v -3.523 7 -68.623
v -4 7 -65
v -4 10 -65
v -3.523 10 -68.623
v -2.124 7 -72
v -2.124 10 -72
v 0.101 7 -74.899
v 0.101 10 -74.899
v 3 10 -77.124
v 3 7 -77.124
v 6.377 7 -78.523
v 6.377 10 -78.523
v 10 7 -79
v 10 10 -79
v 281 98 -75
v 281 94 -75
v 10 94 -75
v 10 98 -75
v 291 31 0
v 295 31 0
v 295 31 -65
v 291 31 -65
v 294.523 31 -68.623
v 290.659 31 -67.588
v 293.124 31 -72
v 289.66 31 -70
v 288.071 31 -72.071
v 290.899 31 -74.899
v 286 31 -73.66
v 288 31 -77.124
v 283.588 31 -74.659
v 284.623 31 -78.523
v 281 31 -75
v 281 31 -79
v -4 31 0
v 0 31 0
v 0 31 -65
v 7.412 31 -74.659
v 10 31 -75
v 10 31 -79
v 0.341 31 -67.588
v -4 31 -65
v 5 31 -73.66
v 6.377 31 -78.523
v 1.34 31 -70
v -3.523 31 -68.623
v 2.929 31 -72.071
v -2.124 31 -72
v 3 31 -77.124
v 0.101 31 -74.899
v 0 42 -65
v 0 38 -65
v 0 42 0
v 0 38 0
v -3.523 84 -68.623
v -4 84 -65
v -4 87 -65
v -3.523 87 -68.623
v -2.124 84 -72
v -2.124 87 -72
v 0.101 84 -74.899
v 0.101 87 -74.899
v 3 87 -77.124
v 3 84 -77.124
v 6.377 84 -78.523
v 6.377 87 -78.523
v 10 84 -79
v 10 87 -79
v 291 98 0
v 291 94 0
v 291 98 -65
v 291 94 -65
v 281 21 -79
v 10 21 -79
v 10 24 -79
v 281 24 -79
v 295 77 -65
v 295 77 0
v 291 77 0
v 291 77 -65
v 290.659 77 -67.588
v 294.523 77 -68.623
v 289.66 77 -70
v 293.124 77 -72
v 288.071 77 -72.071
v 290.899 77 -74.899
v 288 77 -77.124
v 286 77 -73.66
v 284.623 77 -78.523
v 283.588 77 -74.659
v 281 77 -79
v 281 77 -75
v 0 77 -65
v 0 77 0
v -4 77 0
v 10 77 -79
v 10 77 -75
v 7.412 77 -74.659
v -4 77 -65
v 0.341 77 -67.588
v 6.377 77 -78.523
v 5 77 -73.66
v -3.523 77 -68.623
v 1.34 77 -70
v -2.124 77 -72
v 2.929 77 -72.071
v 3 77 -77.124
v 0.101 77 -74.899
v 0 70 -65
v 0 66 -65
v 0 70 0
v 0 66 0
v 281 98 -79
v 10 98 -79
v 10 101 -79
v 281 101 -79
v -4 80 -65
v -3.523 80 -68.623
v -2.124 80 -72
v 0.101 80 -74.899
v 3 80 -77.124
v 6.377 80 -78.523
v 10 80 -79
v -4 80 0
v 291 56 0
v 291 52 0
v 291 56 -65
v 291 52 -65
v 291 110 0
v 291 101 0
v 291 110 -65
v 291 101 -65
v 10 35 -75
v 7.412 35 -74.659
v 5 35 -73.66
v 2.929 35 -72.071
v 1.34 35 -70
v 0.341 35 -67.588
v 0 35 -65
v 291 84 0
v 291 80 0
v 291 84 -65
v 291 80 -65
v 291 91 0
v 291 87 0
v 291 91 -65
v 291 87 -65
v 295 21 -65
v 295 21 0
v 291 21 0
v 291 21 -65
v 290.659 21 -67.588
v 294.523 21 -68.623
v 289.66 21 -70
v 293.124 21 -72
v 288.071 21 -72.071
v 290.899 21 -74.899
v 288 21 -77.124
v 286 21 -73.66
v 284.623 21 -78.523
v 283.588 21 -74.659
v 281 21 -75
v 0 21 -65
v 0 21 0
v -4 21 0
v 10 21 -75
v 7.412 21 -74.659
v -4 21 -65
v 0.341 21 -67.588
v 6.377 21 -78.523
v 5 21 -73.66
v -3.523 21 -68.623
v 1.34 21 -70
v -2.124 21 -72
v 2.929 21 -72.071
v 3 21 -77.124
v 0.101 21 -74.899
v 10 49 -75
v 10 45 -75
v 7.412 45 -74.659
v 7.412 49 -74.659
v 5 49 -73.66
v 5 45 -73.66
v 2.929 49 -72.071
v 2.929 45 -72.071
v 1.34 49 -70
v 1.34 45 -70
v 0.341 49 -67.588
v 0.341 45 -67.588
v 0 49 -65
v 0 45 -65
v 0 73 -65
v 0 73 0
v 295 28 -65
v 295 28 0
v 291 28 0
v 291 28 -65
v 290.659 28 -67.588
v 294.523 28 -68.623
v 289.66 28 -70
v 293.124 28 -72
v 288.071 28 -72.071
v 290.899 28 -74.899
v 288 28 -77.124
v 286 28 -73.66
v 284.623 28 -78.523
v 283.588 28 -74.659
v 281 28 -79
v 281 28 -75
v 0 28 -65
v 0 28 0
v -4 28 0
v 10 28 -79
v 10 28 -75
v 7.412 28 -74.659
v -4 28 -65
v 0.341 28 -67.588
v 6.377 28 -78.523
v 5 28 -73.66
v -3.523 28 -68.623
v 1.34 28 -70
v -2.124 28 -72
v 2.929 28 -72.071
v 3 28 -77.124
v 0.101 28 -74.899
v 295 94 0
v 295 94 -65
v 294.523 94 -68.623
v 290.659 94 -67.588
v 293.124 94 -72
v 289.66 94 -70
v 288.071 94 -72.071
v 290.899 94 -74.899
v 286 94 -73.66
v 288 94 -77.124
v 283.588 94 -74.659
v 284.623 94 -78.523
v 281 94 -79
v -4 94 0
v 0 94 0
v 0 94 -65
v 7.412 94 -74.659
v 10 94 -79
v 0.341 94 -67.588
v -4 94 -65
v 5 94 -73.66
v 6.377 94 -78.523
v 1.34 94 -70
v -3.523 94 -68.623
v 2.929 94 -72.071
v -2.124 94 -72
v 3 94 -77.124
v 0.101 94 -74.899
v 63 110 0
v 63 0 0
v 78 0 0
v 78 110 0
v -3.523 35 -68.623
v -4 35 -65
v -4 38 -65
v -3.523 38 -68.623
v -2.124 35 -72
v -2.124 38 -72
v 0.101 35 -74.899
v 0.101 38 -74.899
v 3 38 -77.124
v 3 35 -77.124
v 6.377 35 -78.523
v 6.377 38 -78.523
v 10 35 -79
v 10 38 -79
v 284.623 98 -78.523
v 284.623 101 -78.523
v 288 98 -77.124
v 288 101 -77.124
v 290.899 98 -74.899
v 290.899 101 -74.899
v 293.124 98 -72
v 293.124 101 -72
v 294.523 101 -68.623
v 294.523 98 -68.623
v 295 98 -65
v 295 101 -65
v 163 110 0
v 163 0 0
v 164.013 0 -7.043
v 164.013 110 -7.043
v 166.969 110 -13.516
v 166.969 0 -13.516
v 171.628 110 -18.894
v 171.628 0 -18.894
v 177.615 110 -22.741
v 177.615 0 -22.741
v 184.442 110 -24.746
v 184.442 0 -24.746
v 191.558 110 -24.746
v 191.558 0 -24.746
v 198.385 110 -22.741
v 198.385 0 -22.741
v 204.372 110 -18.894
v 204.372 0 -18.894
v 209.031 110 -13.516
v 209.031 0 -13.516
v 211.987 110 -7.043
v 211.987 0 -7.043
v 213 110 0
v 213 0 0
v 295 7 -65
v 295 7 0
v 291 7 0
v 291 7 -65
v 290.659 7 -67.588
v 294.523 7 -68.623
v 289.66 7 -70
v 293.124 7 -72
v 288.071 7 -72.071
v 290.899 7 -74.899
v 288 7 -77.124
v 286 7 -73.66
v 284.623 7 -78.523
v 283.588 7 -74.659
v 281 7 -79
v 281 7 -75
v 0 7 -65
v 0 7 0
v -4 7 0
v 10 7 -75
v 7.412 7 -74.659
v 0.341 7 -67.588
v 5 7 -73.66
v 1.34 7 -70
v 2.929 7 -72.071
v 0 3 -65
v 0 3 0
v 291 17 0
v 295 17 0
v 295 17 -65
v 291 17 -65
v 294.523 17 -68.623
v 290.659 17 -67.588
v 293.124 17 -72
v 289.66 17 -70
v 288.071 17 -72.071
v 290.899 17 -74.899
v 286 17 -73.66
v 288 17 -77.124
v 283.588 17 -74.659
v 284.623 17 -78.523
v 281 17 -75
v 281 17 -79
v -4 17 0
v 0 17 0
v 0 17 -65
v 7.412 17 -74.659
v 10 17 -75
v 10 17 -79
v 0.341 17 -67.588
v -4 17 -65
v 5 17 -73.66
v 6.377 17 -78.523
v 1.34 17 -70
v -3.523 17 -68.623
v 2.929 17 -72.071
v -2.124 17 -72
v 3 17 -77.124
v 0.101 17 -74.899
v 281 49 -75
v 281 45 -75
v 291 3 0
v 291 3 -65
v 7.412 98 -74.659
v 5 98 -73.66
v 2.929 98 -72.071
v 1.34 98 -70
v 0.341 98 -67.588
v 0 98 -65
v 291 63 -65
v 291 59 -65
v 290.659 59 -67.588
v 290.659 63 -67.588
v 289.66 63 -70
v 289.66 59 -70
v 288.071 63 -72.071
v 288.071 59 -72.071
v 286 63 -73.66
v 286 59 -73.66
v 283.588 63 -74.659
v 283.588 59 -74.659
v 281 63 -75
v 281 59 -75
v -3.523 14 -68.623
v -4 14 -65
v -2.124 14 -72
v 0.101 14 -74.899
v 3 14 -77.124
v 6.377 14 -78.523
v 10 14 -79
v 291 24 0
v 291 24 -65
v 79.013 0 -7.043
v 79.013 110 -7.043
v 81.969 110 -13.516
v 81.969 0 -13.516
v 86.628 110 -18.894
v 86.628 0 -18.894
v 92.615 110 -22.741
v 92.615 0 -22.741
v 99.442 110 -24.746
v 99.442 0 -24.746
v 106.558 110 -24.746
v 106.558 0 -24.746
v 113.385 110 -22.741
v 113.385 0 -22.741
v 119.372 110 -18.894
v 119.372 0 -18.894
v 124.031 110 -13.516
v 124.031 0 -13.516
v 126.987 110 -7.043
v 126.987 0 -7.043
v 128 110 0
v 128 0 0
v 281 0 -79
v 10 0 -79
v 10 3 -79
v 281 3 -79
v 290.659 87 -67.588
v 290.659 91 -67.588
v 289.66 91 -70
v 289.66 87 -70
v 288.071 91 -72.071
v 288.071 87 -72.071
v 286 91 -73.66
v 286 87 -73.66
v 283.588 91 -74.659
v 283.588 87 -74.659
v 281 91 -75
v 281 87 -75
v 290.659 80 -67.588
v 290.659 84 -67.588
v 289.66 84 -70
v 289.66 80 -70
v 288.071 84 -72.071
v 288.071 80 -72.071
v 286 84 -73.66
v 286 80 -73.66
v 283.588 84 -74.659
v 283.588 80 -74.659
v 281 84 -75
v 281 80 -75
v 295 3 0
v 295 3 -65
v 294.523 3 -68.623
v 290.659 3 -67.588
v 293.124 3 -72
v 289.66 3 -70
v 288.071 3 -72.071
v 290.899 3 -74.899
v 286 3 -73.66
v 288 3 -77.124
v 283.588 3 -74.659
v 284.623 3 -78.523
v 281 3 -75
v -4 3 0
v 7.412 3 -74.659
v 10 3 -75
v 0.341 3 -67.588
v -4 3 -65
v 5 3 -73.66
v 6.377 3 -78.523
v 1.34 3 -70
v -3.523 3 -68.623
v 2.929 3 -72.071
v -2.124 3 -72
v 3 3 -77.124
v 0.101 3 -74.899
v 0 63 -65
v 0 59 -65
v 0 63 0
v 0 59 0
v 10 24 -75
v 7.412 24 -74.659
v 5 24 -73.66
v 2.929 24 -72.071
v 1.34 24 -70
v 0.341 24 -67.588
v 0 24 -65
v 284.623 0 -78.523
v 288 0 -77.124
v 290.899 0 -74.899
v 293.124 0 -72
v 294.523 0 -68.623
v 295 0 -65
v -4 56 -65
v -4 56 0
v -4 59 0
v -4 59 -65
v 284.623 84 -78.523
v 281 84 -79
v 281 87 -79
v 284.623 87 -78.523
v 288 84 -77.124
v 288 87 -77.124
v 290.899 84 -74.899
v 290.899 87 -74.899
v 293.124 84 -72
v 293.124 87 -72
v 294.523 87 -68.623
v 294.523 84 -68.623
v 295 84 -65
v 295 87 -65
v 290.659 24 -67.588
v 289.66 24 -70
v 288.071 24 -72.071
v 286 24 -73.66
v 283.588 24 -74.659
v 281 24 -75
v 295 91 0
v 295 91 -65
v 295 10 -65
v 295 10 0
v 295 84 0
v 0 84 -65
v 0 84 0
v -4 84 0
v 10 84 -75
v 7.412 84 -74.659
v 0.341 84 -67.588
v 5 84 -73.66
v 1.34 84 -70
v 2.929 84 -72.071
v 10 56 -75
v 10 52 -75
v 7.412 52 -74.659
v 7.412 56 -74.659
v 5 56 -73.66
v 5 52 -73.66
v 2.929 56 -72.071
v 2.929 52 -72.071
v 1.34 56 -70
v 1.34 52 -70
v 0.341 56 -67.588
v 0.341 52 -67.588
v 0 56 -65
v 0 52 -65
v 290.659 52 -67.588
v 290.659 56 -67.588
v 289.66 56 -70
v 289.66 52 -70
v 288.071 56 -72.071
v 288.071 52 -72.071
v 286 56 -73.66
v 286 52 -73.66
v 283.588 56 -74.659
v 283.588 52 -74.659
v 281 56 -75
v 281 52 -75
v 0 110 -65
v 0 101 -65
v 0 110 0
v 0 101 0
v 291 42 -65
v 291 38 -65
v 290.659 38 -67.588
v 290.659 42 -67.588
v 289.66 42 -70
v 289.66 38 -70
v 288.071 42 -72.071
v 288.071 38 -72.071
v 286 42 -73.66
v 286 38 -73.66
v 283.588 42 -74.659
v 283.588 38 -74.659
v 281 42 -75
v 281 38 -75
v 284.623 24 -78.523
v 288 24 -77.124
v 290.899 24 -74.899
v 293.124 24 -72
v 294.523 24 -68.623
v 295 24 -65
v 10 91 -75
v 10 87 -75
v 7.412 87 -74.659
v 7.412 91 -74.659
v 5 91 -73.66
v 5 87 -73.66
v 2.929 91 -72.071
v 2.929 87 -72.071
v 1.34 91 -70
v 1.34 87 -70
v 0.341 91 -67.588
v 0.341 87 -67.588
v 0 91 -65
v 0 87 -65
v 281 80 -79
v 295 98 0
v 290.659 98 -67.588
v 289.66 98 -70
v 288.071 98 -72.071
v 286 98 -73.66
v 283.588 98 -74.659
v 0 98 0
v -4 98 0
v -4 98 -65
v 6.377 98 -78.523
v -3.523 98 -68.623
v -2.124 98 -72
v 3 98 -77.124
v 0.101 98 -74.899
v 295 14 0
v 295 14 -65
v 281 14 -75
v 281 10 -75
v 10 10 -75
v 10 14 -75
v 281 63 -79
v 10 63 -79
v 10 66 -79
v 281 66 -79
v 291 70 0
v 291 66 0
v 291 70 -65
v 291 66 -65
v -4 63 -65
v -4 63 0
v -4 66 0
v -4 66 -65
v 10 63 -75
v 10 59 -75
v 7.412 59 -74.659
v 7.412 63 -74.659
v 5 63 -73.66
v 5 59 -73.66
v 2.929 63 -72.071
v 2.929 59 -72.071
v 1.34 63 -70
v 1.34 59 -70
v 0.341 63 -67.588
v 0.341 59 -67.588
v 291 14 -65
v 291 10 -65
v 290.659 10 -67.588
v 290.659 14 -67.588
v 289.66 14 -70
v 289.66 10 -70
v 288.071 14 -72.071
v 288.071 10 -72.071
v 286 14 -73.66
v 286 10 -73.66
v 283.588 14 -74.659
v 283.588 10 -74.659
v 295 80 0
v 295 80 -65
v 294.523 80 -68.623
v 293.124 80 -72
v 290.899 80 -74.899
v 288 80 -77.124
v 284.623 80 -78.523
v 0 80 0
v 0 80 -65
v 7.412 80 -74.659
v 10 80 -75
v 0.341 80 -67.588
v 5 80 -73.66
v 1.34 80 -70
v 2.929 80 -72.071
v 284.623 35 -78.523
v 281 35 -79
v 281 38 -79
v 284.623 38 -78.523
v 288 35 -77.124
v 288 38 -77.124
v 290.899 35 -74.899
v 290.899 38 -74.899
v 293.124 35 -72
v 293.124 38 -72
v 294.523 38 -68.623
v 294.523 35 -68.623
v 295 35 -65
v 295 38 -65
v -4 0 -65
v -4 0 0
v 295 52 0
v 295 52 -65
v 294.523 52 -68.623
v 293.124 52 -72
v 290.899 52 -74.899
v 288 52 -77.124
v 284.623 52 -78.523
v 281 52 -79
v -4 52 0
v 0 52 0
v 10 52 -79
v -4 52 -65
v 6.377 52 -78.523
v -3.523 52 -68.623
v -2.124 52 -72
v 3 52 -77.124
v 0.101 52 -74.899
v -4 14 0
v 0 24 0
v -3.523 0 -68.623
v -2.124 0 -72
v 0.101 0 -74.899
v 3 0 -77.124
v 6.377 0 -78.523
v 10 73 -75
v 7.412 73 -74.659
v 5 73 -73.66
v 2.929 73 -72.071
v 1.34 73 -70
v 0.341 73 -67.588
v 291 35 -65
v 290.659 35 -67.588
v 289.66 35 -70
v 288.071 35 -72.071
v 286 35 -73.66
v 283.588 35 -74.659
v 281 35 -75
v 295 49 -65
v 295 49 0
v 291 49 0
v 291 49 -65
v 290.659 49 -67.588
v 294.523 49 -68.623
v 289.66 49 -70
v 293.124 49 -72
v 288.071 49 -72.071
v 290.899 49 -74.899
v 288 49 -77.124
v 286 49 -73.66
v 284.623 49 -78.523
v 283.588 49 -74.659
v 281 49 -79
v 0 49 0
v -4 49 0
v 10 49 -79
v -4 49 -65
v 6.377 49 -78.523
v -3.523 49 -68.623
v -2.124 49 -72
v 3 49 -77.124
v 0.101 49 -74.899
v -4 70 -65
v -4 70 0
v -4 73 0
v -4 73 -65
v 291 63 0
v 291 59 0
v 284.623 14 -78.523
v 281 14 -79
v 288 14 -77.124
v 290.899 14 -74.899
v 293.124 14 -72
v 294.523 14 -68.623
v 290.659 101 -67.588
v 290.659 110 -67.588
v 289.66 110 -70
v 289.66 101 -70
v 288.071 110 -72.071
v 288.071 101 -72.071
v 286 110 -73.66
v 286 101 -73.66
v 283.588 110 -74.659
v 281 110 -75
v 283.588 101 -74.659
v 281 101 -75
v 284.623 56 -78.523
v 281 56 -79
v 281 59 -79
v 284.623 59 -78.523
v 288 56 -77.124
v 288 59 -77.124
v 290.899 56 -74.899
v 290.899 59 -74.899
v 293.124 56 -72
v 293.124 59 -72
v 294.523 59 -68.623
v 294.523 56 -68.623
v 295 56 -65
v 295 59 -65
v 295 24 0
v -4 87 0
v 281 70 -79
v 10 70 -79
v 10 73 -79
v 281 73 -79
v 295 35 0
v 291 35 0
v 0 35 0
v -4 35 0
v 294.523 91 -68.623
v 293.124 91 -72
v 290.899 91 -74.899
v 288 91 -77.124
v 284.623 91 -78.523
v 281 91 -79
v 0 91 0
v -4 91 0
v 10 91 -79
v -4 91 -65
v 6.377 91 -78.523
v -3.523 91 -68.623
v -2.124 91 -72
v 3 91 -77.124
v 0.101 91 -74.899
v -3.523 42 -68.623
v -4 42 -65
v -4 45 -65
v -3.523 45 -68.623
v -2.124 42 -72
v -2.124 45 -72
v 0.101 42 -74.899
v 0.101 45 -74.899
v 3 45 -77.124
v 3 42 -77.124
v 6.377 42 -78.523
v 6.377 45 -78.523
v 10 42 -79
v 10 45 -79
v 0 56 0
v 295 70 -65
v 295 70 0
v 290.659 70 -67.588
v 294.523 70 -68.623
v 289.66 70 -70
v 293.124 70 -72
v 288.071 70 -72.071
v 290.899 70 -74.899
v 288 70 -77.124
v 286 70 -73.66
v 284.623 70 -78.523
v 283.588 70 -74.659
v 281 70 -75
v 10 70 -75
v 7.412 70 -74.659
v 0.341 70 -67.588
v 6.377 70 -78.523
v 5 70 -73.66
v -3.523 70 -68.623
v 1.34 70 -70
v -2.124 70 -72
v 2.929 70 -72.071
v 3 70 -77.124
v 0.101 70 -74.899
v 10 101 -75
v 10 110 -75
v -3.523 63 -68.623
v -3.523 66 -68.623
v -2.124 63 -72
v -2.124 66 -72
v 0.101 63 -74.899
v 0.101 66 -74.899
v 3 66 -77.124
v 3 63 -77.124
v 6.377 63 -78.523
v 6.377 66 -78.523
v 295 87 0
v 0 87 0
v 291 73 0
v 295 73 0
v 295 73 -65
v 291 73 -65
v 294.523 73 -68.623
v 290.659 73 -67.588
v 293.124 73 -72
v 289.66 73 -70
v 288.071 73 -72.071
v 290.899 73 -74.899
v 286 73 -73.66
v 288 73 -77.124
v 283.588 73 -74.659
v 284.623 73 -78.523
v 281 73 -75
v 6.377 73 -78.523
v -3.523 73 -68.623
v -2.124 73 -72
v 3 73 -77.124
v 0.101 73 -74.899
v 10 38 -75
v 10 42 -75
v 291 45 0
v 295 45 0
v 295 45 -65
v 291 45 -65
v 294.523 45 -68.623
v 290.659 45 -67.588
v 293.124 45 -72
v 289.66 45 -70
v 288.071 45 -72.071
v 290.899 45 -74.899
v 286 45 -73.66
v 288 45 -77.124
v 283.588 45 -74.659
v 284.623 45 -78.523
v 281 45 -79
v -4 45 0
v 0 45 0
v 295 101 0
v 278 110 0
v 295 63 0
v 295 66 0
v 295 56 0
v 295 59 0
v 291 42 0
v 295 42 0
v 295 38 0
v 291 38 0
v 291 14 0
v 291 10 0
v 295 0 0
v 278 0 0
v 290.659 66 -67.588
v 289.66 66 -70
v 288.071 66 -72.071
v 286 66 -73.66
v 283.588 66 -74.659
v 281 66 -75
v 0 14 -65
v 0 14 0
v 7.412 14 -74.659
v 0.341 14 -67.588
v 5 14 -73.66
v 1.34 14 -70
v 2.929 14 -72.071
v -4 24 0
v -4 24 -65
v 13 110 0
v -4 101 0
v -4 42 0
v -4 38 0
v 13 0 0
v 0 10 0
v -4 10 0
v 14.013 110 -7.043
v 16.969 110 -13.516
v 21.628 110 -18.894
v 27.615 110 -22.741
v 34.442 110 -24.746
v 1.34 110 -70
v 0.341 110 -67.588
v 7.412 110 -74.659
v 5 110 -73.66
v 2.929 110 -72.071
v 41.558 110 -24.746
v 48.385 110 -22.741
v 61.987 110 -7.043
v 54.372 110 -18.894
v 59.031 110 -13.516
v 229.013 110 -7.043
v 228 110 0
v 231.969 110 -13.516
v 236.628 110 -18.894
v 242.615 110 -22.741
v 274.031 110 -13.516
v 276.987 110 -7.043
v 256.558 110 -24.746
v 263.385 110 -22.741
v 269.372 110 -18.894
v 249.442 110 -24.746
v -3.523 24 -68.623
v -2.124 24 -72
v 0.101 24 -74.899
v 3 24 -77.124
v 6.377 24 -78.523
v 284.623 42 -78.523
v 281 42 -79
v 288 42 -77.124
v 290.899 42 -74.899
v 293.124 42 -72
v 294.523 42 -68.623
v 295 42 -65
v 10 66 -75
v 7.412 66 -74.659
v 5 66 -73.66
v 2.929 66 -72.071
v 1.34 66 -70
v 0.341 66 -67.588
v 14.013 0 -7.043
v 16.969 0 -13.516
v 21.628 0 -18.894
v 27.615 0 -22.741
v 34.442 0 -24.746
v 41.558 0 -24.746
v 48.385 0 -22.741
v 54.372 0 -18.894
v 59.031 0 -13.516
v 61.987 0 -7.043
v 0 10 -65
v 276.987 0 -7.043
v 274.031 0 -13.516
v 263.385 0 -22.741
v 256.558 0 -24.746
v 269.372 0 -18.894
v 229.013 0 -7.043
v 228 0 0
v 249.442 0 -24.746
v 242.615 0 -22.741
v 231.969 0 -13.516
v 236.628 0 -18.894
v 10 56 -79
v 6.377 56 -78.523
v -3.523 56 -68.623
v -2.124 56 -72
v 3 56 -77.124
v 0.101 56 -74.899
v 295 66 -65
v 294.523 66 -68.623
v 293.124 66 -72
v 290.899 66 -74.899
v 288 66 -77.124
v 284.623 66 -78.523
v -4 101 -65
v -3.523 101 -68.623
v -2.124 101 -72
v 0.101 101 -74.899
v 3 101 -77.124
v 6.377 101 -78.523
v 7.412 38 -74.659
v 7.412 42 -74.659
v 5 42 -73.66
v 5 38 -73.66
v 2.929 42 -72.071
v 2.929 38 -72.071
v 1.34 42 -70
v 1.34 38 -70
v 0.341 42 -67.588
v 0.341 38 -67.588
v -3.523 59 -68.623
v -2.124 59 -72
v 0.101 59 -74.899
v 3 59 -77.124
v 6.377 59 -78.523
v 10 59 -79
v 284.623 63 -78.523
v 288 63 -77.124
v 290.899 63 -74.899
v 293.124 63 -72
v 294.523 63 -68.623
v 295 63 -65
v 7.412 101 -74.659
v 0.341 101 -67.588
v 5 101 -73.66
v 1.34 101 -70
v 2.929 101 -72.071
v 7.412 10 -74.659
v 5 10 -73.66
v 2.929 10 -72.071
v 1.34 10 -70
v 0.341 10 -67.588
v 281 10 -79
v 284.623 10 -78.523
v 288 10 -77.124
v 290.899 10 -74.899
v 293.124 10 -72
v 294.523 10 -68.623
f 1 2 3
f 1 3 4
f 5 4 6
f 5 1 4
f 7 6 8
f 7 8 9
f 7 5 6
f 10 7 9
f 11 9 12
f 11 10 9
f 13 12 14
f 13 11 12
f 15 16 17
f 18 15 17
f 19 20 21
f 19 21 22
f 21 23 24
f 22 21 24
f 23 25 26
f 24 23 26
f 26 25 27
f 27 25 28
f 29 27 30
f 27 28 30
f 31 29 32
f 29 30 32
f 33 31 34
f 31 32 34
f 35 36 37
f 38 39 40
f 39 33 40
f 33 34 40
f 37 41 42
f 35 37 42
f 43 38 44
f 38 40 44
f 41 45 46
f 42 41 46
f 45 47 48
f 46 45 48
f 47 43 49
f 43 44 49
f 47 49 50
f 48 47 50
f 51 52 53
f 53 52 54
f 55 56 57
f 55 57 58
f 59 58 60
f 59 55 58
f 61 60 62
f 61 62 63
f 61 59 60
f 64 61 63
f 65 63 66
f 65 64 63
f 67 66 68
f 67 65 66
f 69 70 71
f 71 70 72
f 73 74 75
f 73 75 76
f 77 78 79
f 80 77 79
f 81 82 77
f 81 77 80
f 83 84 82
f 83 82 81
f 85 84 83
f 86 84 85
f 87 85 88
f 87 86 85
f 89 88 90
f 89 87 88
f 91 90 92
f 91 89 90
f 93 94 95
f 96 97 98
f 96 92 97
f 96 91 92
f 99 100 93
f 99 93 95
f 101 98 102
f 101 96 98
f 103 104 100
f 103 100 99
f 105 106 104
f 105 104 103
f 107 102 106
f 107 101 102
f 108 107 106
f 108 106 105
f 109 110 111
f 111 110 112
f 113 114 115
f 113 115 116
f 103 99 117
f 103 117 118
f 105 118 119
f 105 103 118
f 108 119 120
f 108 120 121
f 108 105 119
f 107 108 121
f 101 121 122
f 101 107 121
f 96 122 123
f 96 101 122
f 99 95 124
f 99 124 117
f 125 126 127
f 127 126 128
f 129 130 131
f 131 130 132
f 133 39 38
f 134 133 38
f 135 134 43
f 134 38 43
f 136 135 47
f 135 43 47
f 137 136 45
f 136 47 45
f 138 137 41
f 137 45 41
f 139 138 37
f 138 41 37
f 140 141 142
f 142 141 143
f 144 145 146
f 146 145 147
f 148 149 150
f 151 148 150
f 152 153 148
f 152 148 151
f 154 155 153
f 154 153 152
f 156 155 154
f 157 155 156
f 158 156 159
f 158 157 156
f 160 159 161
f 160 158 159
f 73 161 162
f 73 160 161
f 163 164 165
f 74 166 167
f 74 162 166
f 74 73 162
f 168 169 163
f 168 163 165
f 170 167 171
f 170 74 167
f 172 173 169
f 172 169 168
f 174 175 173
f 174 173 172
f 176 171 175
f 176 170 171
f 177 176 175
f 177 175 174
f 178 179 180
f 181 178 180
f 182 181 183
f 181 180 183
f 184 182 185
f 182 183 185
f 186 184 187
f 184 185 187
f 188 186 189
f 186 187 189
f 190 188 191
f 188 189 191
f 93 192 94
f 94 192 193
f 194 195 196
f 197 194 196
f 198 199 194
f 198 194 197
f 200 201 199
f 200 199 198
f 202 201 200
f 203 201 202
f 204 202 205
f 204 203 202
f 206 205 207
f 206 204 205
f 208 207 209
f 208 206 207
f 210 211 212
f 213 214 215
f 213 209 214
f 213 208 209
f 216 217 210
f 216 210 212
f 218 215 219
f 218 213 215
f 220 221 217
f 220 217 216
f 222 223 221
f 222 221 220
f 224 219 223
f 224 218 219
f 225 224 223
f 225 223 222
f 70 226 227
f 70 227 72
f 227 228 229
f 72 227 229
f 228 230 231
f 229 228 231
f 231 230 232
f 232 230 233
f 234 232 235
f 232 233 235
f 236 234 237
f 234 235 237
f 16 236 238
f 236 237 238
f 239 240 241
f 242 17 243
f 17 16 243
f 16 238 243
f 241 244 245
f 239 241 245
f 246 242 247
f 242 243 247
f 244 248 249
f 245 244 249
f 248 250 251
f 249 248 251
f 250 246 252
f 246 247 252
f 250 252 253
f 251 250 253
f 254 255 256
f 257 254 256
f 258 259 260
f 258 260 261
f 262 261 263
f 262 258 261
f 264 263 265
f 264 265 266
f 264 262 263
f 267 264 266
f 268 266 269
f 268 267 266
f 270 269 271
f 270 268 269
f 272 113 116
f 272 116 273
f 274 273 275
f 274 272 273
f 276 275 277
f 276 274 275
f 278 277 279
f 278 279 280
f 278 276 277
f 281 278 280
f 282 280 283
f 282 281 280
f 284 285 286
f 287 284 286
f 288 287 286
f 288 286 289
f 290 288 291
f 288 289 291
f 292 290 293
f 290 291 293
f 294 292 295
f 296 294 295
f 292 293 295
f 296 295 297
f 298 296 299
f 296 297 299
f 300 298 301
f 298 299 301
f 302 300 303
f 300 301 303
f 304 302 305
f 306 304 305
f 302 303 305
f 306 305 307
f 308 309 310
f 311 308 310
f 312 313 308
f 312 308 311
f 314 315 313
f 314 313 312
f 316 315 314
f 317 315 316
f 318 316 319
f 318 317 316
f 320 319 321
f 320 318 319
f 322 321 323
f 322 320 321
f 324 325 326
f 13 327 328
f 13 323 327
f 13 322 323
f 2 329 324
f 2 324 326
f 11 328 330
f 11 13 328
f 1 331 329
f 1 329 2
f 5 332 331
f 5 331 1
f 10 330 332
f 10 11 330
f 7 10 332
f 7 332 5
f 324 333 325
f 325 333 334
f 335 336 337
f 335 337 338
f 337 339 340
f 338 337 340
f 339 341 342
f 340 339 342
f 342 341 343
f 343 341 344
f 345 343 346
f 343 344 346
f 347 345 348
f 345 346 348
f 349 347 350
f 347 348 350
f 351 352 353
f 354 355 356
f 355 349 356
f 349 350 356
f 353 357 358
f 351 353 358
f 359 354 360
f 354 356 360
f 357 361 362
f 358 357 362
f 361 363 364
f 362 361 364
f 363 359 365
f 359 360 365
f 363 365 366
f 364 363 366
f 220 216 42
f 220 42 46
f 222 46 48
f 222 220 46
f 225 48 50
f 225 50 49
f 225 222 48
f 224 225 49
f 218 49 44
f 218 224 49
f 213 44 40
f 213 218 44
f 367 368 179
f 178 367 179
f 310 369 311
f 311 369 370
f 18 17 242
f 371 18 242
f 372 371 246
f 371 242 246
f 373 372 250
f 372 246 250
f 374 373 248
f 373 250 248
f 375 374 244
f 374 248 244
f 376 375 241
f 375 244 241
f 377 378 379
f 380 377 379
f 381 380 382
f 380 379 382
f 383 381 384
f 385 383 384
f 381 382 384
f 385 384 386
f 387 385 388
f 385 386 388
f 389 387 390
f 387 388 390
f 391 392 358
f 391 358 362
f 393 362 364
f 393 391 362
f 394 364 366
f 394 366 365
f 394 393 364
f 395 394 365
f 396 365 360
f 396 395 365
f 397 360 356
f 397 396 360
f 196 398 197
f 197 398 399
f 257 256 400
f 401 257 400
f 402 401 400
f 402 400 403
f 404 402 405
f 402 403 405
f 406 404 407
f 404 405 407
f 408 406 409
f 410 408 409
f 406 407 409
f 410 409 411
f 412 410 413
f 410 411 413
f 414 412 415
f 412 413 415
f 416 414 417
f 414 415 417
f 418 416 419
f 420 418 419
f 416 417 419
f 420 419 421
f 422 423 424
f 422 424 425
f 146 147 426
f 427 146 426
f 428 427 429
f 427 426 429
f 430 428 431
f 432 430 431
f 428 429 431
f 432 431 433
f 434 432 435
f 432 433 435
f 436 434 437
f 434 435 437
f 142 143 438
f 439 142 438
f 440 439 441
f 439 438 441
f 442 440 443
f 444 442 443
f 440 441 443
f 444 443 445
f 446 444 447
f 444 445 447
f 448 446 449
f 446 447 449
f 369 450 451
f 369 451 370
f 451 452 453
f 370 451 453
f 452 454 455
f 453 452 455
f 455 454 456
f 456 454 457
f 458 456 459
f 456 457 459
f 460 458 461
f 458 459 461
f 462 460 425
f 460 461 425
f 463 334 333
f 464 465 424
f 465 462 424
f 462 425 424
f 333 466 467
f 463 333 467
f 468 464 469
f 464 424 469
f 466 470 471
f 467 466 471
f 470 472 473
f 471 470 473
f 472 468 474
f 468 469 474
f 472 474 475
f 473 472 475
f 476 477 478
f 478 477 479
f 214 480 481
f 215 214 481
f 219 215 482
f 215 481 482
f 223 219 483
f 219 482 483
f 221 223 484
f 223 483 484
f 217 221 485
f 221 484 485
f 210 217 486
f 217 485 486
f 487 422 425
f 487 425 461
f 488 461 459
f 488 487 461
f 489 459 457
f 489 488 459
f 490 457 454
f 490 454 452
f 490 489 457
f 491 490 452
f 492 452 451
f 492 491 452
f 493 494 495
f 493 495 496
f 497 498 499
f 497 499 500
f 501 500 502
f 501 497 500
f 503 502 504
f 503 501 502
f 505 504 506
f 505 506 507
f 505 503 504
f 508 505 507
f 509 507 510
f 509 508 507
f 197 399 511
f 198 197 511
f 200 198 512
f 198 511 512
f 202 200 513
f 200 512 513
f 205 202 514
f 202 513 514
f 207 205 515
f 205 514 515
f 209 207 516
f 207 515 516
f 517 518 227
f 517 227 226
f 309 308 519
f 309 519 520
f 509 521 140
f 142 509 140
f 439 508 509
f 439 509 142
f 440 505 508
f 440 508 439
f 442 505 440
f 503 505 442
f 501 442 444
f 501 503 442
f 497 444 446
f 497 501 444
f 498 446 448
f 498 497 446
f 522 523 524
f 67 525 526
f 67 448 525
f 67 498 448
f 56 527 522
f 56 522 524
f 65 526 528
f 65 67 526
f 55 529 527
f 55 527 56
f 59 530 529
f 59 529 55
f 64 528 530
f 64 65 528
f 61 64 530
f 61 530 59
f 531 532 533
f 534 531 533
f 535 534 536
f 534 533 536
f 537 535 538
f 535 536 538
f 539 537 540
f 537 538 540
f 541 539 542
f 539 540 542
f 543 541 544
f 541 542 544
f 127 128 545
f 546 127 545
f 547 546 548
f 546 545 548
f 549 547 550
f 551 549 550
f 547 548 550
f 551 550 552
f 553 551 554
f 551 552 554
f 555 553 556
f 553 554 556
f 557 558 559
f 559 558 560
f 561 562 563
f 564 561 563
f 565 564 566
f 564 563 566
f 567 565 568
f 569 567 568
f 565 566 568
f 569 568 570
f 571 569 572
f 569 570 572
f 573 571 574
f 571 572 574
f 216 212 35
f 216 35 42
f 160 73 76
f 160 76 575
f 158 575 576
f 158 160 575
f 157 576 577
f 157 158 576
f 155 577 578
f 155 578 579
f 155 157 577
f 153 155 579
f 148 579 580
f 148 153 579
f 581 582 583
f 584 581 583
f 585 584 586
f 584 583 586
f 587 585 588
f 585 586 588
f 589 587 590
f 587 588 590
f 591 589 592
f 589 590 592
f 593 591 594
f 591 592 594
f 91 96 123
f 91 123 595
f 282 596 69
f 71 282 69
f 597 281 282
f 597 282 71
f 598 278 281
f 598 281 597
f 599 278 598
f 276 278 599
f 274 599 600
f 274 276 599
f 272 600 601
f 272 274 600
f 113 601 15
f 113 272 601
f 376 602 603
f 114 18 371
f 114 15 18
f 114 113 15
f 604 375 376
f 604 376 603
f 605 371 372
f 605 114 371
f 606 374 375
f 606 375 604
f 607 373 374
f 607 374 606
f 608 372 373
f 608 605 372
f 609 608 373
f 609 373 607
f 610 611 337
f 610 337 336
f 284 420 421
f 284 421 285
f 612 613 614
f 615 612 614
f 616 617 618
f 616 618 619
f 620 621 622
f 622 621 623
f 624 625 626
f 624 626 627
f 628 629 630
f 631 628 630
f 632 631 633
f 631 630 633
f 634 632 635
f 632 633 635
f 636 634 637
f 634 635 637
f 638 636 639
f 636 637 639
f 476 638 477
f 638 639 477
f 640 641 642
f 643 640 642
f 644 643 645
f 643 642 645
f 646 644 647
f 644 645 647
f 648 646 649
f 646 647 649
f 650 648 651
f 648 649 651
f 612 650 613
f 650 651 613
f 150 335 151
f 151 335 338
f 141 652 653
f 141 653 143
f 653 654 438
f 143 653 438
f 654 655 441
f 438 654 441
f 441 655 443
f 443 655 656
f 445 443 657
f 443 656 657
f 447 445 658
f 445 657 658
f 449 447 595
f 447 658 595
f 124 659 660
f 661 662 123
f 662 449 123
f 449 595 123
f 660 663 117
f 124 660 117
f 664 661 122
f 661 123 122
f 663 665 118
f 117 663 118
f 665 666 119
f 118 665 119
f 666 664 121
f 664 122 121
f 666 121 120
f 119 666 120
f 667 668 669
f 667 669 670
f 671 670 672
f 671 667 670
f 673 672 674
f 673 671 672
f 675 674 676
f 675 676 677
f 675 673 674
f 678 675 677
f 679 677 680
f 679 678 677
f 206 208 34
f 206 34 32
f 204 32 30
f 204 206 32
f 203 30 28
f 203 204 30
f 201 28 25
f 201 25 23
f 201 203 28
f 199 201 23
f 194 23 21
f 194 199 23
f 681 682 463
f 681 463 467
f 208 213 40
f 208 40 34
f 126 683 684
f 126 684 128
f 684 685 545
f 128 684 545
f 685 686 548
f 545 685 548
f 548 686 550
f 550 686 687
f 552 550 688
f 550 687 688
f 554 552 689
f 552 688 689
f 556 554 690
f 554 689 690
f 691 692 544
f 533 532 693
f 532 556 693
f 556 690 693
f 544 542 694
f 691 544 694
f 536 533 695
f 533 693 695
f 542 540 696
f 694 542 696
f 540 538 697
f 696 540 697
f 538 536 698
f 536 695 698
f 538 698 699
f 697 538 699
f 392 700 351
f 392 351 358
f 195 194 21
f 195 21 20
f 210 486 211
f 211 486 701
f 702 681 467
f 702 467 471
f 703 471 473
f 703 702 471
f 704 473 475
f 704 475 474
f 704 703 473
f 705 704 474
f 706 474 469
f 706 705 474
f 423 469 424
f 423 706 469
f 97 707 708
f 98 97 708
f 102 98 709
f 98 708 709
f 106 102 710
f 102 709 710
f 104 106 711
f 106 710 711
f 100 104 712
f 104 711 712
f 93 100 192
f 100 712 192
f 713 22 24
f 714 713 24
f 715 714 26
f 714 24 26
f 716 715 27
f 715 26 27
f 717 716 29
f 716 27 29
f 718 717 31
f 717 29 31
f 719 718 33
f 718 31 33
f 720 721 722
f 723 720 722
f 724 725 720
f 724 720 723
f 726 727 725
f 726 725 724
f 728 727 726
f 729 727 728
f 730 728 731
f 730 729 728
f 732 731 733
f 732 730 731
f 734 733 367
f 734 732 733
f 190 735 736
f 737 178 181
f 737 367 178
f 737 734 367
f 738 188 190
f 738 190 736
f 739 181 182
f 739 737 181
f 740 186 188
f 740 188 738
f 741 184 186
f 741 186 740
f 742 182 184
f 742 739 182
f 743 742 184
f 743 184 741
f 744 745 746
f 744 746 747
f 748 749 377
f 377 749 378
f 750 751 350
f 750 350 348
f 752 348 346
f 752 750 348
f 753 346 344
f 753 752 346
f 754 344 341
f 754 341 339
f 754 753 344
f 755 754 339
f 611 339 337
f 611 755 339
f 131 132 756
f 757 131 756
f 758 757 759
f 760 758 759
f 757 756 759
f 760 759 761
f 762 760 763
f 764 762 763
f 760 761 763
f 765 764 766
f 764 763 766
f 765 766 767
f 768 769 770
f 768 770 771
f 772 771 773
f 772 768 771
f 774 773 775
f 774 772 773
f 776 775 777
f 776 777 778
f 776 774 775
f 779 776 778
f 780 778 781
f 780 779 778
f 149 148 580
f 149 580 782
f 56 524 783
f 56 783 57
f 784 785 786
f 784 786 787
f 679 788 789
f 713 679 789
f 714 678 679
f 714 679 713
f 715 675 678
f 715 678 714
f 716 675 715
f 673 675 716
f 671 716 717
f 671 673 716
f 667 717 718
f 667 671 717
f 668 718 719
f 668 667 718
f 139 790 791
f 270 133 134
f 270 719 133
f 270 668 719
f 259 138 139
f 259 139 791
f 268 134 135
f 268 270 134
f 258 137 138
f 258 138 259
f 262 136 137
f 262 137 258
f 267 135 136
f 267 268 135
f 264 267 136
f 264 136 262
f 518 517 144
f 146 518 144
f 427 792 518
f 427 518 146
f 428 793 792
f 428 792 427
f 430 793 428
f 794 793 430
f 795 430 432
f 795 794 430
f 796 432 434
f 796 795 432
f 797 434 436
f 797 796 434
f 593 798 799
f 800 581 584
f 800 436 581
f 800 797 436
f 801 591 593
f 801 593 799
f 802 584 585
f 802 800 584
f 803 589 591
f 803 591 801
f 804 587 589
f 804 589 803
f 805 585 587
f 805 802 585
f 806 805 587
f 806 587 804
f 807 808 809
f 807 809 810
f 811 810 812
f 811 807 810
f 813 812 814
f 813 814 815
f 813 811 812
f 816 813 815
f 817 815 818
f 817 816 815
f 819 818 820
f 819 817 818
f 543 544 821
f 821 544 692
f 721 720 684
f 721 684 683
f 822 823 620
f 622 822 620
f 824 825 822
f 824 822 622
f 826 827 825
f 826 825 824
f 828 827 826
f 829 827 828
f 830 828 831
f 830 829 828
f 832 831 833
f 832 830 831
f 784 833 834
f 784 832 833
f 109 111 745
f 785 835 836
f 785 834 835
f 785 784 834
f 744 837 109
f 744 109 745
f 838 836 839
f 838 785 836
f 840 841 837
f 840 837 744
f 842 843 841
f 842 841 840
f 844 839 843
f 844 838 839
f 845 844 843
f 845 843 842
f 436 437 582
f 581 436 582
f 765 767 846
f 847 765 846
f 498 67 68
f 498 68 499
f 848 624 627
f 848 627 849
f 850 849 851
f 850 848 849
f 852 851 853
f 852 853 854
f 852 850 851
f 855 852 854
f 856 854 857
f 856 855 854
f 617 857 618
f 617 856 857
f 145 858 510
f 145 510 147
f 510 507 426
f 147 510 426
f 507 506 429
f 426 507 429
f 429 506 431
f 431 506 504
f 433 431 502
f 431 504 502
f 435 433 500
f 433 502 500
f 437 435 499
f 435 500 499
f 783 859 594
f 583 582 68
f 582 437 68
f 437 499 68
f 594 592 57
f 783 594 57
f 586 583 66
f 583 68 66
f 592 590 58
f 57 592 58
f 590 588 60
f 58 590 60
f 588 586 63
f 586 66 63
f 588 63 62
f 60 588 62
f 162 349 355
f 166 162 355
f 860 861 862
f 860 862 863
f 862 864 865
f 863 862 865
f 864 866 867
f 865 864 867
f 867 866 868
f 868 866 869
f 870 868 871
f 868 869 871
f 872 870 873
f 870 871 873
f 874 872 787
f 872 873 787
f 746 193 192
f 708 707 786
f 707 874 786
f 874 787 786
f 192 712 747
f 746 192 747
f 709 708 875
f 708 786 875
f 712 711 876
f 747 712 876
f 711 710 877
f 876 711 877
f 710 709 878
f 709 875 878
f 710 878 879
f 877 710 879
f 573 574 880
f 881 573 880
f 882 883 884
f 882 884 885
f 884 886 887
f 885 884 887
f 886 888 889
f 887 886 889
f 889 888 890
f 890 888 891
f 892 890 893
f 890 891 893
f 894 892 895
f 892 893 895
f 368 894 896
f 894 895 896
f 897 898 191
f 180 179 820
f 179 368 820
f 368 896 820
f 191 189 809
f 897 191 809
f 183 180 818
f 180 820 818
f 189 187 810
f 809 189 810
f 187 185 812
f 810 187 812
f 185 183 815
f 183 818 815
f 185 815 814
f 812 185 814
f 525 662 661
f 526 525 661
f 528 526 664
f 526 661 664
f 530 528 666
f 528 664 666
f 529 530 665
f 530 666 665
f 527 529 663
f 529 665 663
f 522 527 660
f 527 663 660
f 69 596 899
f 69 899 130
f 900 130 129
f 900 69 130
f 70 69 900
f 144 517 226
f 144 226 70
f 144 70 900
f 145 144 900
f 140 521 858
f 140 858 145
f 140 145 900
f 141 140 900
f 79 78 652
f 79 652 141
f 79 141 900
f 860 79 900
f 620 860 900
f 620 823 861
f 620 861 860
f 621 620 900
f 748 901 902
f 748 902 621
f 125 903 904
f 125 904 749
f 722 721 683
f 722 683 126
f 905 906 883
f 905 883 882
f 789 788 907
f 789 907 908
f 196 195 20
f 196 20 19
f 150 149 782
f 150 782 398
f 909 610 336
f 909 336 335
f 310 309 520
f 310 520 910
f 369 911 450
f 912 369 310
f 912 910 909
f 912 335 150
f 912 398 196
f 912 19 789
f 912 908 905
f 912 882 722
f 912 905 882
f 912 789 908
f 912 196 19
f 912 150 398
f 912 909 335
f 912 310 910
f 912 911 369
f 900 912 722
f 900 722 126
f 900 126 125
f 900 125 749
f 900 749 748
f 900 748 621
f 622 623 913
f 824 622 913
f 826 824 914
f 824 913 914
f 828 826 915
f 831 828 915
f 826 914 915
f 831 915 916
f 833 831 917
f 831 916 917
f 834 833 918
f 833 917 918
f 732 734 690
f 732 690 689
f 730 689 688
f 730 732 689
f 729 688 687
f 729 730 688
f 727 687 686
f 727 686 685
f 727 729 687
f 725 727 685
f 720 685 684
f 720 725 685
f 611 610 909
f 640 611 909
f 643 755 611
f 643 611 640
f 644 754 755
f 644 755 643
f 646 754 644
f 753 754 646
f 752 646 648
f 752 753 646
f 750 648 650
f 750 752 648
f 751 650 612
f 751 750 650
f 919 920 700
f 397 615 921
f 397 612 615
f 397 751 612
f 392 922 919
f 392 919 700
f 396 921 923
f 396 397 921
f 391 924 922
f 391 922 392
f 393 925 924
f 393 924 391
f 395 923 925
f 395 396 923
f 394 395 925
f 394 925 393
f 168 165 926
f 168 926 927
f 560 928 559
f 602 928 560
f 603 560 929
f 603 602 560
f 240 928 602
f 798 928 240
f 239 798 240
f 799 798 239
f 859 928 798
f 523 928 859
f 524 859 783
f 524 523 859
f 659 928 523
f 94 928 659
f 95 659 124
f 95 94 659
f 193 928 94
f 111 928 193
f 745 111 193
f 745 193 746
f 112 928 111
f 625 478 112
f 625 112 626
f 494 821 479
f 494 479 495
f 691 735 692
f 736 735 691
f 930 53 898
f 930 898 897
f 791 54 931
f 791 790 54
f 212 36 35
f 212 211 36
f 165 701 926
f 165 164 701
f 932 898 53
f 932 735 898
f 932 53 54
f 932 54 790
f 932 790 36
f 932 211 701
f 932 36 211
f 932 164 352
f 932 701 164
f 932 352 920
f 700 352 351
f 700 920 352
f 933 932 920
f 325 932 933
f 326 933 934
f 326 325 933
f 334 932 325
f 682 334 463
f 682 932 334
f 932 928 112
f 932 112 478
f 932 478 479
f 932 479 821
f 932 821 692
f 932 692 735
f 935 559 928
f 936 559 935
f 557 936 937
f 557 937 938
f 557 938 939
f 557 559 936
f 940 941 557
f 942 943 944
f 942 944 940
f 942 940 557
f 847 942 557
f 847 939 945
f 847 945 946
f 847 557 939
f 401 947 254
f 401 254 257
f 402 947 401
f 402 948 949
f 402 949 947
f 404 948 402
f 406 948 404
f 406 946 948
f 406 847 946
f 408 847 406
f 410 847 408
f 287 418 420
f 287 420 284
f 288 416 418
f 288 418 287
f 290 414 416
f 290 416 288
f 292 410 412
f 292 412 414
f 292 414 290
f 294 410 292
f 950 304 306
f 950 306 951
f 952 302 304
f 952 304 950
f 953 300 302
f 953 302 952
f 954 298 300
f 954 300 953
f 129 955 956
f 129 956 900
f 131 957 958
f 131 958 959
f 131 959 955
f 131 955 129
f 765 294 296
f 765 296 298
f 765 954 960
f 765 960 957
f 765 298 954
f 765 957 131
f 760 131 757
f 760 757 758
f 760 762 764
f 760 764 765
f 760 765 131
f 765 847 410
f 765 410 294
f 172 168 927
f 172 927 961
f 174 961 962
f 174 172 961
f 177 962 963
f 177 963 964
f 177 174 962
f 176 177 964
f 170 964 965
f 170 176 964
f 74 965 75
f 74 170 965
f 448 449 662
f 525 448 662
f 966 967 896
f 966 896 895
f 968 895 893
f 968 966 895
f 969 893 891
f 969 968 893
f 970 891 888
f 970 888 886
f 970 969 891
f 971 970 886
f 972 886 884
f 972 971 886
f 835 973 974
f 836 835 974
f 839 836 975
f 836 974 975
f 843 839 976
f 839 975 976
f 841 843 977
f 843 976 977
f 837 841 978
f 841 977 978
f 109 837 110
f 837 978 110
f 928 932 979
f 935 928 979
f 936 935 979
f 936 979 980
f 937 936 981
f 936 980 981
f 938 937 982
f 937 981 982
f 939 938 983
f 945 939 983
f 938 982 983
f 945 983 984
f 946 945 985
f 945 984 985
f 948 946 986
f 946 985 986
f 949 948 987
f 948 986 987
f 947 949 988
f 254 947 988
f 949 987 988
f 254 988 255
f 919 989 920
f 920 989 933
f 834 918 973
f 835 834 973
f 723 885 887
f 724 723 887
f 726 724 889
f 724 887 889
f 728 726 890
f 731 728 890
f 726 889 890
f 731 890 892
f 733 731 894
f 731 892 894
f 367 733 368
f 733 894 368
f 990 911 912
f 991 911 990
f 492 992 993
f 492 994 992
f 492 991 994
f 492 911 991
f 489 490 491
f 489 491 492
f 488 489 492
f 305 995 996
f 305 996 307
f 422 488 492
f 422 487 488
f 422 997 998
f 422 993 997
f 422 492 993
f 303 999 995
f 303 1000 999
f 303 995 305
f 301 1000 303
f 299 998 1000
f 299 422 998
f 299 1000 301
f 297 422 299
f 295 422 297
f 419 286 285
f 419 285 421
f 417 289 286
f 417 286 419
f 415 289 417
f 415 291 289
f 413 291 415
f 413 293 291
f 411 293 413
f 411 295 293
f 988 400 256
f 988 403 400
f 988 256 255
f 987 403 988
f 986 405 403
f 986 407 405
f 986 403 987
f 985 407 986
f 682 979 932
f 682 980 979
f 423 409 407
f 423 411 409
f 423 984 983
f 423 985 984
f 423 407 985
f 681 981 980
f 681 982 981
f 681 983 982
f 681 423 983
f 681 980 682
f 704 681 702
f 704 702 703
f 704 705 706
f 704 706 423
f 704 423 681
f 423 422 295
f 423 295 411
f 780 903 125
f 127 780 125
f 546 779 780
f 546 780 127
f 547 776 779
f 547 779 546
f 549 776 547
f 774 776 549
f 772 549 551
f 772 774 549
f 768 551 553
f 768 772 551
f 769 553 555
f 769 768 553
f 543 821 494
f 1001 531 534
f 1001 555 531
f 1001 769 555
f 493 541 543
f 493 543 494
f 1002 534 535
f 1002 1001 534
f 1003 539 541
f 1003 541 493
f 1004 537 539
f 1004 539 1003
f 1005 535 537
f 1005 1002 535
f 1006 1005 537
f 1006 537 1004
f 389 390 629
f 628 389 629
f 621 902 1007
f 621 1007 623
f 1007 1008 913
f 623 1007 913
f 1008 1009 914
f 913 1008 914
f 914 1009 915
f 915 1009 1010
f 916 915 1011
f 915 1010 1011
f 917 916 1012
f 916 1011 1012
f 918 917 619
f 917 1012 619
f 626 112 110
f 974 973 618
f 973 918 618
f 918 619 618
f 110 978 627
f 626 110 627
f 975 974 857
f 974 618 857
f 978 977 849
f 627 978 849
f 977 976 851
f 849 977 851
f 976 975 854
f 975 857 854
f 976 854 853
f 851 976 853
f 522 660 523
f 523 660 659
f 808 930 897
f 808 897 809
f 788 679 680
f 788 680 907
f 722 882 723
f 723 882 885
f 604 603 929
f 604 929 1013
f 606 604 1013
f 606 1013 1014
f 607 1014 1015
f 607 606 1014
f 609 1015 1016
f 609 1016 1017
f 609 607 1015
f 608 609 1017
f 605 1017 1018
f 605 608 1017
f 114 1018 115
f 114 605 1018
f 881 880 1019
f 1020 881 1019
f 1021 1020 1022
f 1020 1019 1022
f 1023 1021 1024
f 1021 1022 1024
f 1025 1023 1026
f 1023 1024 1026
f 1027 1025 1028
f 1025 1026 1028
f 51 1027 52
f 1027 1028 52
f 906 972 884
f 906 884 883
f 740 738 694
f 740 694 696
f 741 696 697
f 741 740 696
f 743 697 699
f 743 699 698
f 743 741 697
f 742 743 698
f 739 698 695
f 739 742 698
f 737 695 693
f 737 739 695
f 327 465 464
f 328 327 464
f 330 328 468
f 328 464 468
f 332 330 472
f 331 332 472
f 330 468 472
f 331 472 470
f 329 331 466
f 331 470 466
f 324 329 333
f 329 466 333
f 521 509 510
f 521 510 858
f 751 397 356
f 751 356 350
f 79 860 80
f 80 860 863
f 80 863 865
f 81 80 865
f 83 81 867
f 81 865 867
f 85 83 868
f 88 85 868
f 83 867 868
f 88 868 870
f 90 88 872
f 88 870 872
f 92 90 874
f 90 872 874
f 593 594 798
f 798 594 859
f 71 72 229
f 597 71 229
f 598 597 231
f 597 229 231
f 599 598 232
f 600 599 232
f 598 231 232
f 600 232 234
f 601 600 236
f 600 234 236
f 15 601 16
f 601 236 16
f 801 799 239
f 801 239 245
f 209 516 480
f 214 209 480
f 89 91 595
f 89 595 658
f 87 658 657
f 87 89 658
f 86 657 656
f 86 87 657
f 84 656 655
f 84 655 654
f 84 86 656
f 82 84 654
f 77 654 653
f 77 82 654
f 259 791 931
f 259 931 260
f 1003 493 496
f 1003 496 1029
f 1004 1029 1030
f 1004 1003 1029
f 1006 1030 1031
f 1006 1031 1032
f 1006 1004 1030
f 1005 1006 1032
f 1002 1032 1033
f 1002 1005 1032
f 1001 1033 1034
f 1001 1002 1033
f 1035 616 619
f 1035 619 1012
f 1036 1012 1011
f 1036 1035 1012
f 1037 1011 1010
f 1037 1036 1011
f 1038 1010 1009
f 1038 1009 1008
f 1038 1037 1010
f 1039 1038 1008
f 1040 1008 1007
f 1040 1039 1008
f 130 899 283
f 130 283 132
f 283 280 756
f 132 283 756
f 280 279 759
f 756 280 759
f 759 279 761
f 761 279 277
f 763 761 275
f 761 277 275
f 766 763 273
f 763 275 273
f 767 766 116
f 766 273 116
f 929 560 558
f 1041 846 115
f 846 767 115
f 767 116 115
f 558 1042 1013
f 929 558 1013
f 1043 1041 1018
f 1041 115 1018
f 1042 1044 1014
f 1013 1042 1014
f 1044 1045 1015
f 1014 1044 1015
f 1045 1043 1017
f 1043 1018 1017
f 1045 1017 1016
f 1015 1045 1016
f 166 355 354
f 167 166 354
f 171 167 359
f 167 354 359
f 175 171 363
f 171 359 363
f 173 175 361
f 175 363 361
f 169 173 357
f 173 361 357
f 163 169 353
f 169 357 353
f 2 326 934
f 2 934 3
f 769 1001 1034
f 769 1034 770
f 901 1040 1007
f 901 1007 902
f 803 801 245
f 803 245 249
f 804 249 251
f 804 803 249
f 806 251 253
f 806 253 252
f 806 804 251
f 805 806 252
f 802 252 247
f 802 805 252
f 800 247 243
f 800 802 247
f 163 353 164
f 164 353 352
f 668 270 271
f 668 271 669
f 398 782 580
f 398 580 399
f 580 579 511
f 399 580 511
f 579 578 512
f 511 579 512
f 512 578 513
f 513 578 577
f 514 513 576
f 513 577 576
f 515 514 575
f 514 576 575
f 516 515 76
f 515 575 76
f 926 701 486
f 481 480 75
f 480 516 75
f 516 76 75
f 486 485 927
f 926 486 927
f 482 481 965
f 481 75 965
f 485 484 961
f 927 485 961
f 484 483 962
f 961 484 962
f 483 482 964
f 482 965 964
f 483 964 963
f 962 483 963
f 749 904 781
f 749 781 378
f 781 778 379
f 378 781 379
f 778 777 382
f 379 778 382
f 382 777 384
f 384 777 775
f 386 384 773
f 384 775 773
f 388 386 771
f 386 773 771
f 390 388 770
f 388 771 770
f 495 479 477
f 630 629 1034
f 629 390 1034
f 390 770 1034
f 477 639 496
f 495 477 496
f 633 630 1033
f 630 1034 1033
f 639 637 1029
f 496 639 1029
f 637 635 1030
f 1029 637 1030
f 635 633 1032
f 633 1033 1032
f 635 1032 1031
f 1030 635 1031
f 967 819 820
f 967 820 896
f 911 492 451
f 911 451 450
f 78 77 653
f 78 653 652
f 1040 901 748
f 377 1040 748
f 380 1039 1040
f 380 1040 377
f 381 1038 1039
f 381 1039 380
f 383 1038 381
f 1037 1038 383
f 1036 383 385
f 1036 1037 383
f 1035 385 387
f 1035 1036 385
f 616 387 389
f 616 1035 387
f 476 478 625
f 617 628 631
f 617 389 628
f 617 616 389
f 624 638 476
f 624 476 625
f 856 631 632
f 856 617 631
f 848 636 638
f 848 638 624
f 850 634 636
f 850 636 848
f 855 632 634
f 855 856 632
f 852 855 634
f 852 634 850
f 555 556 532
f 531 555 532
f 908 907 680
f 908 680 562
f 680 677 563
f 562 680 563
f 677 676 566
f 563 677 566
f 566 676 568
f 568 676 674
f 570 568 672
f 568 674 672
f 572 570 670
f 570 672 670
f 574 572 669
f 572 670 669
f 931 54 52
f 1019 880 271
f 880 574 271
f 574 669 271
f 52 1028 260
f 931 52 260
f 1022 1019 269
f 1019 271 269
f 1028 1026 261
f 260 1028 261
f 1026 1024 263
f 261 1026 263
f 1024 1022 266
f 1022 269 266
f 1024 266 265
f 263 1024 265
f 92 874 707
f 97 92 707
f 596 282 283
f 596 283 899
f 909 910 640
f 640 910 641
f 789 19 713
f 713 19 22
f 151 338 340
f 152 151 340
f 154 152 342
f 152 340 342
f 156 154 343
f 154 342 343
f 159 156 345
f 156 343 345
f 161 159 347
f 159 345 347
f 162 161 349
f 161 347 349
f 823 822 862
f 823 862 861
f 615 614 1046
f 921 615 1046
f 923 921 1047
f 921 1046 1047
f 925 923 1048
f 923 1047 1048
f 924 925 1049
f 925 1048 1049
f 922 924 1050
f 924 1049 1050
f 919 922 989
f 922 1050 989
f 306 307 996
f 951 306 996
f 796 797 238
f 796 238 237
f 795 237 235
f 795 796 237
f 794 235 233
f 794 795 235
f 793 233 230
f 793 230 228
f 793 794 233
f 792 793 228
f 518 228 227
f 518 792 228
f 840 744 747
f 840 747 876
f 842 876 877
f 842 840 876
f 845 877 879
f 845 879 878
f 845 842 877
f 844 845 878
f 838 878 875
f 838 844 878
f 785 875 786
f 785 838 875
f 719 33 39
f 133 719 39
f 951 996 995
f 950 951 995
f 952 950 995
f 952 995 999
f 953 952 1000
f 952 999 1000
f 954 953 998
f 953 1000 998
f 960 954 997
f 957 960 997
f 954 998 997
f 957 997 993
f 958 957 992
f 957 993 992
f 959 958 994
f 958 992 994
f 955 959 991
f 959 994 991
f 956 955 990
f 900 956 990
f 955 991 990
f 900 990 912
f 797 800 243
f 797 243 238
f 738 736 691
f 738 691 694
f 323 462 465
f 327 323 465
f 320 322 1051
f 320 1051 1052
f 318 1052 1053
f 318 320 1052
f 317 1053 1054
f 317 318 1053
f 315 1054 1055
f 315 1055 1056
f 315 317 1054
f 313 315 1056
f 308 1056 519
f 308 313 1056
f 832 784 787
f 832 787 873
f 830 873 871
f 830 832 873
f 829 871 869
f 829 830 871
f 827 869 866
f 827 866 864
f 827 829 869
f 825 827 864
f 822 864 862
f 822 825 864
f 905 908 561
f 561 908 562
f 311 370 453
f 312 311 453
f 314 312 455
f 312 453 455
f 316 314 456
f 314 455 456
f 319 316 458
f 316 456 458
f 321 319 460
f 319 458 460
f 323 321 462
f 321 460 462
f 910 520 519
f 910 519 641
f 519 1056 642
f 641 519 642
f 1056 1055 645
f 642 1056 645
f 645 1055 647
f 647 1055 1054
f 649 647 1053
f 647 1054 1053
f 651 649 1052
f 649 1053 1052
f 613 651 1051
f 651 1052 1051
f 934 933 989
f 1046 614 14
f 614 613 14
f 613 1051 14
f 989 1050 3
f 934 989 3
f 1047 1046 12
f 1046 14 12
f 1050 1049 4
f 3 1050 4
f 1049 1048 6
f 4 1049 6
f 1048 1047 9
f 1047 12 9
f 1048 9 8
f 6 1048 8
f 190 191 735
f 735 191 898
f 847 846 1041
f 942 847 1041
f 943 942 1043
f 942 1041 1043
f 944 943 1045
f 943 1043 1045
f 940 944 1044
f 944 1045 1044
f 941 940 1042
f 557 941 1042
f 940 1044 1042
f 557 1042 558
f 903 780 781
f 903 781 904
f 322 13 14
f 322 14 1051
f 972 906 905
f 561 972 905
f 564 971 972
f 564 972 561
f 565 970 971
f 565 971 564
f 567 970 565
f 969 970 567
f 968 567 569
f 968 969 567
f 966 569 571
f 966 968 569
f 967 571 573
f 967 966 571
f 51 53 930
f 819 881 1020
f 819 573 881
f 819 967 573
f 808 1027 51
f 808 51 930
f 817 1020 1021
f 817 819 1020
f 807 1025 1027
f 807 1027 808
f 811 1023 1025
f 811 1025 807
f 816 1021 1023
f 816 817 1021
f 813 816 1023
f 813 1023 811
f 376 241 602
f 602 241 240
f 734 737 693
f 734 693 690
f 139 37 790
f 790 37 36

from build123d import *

# Parameters (mm, degrees)
BOSS_EXTRUDE1_DEPTH = 110
BOSS_EXTRUDE3_DEPTH = 3
LPATTERN1_COUNT     = 15
LPATTERN1_PITCH     = 7


with BuildPart() as part:
    # Sketch2 → Boss-Extrude1 (new body)
    with BuildSketch(Plane(origin=(0, 0, 0), x_dir=(1, 0, 0), z_dir=(0, 1, 0))):
        with BuildLine():
            Line((0, 0), (13, 0))
            ThreePointArc((13, 0), (38, 25), (63, 0))
            Line((63, 0), (78, 0))
            ThreePointArc((78, 0), (103, 25), (128, 0))
            Line((128, 0), (163, 0))
            ThreePointArc((163, 0), (188, 25), (213, 0))
            Line((213, 0), (228, 0))
            ThreePointArc((228, 0), (253, 25), (278, 0))
            Line((278, 0), (291, 0))
            Line((291, 0), (291, 65))
            ThreePointArc((291, 65), (288.071067812, 72.071067812), (281, 75))
            Line((281, 75), (10, 75))
            ThreePointArc((10, 75), (2.928932188, 72.071067812), (0, 65))
            Line((0, 65), (0, 0))
        make_face()
    extrude(amount=BOSS_EXTRUDE1_DEPTH)

    # Sketch4 → Boss-Extrude3 (add)
    with BuildSketch(Plane(origin=(0, 0, 0), x_dir=(1, 0, 0), z_dir=(0, 1, 0))):
        with BuildLine():
            ThreePointArc((10, 75), (2.928932188, 72.071067812), (0, 65))
            Line((0, 65), (0, 0))
            Line((0, 0), (-4, 0))
            Line((-4, 0), (-4, 65))
            ThreePointArc((-4, 65), (0.100505063, 74.899494937), (10, 79))
            Line((10, 79), (281, 79))
            ThreePointArc((281, 79), (290.899494937, 74.899494937), (295, 65))
            Line((295, 65), (295, 0))
            Line((295, 0), (291, 0))
            Line((291, 0), (291, 65))
            ThreePointArc((291, 65), (288.071067812, 72.071067812), (281, 75))
            Line((281, 75), (10, 75))
        make_face()
    boss_extrude3 = extrude(amount=BOSS_EXTRUDE3_DEPTH)

    # LPattern1: Boss-Extrude3 ×15
    with Locations(*[(0, i * LPATTERN1_PITCH, 0) for i in range(1, LPATTERN1_COUNT)]):
        add(boss_extrude3)


solid = part.part
